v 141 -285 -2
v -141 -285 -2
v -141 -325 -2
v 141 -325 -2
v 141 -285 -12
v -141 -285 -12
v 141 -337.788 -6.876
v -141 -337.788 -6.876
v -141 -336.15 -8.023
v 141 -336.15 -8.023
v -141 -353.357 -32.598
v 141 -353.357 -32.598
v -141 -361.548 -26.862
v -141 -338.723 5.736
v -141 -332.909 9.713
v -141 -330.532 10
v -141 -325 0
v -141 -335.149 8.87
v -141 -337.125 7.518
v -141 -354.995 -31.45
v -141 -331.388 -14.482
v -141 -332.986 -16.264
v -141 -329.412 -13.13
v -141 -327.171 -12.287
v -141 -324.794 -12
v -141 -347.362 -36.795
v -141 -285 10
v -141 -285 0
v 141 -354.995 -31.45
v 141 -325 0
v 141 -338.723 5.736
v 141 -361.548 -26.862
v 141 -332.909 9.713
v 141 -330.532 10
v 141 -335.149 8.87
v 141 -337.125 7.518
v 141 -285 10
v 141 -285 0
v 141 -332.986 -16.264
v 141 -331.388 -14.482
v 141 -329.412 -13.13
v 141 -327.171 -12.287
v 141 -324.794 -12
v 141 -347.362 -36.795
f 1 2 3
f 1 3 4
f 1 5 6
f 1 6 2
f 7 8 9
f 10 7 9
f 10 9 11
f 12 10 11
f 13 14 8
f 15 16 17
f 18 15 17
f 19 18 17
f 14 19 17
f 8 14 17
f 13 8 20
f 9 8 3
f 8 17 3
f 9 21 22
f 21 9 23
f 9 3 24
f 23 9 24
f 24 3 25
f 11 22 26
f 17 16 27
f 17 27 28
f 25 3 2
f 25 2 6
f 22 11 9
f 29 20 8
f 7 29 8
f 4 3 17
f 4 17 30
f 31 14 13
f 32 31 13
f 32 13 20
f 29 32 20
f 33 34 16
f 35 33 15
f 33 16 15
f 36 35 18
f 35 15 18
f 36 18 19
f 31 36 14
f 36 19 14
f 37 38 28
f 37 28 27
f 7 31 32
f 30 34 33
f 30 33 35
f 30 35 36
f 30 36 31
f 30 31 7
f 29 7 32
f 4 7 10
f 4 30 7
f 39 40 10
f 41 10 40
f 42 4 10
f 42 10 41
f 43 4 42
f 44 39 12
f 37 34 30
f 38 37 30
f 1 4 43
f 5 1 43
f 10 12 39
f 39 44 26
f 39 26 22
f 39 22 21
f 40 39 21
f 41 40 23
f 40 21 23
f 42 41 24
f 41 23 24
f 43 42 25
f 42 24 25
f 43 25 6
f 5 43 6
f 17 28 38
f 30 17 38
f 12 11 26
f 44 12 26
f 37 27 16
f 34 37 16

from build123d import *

# Parameters (mm, degrees)
BOSS_EXTRUDE1_DEPTH      = 141
BOSS_EXTRUDE1_DEPTH_BACK = 141
CAVITY1_START            = -2
CAVITY1_OUTLINE_W        = 282
CAVITY1_OUTLINE_H        = 40
CAVITY1_DEPTH            = 2


# Read off the part's stored shape, not the designer's step: Cavity1
with BuildPart() as part:
    # Sketch1 → Boss-Extrude1 (new, two sides: drawn at the far end of the back side and taken through both)
    with BuildSketch(Plane(origin=(0, 0, 0), x_dir=(0, 0, -1), z_dir=(1, 0, 0)).offset(-BOSS_EXTRUDE1_DEPTH_BACK)):
        with BuildLine():
            Line((12, -285), (-10, -285))
            Line((-10, -285), (-10, -330.531793911))
            ThreePointArc((-10, -330.531793911), (-8.870108332, -335.149280044), (-5.735764364, -338.723314354))
            Line((-5.735764364, -338.723314354), (26.861841993, -361.548404053))
            Line((26.861841993, -361.548404053), (31.450453484, -354.995187698))
            Line((31.450453484, -354.995187698), (6.875892155, -337.787894608))
            Line((6.875892155, -337.787894608), (8.023045028, -336.149590519))
            Line((8.023045028, -336.149590519), (32.597606357, -353.35688361))
            Line((32.597606357, -353.35688361), (36.795346904, -347.361888815))
            Line((36.795346904, -347.361888815), (16.264235636, -332.985849937))
            ThreePointArc((16.264235636, -332.985849937), (13.129891668, -329.411815627), (12, -324.794329494))
            Line((12, -324.794329494), (12, -285))
        make_face()
    extrude(amount=BOSS_EXTRUDE1_DEPTH + BOSS_EXTRUDE1_DEPTH_BACK)

    # Cavity1 outline → Cavity1 (cut)
    with BuildSketch(Plane.XY.offset(CAVITY1_START)):
        with Locations((0, -305)):
            Rectangle(CAVITY1_OUTLINE_W, CAVITY1_OUTLINE_H)
    extrude(amount=CAVITY1_DEPTH, mode=Mode.SUBTRACT)


solid = part.part
